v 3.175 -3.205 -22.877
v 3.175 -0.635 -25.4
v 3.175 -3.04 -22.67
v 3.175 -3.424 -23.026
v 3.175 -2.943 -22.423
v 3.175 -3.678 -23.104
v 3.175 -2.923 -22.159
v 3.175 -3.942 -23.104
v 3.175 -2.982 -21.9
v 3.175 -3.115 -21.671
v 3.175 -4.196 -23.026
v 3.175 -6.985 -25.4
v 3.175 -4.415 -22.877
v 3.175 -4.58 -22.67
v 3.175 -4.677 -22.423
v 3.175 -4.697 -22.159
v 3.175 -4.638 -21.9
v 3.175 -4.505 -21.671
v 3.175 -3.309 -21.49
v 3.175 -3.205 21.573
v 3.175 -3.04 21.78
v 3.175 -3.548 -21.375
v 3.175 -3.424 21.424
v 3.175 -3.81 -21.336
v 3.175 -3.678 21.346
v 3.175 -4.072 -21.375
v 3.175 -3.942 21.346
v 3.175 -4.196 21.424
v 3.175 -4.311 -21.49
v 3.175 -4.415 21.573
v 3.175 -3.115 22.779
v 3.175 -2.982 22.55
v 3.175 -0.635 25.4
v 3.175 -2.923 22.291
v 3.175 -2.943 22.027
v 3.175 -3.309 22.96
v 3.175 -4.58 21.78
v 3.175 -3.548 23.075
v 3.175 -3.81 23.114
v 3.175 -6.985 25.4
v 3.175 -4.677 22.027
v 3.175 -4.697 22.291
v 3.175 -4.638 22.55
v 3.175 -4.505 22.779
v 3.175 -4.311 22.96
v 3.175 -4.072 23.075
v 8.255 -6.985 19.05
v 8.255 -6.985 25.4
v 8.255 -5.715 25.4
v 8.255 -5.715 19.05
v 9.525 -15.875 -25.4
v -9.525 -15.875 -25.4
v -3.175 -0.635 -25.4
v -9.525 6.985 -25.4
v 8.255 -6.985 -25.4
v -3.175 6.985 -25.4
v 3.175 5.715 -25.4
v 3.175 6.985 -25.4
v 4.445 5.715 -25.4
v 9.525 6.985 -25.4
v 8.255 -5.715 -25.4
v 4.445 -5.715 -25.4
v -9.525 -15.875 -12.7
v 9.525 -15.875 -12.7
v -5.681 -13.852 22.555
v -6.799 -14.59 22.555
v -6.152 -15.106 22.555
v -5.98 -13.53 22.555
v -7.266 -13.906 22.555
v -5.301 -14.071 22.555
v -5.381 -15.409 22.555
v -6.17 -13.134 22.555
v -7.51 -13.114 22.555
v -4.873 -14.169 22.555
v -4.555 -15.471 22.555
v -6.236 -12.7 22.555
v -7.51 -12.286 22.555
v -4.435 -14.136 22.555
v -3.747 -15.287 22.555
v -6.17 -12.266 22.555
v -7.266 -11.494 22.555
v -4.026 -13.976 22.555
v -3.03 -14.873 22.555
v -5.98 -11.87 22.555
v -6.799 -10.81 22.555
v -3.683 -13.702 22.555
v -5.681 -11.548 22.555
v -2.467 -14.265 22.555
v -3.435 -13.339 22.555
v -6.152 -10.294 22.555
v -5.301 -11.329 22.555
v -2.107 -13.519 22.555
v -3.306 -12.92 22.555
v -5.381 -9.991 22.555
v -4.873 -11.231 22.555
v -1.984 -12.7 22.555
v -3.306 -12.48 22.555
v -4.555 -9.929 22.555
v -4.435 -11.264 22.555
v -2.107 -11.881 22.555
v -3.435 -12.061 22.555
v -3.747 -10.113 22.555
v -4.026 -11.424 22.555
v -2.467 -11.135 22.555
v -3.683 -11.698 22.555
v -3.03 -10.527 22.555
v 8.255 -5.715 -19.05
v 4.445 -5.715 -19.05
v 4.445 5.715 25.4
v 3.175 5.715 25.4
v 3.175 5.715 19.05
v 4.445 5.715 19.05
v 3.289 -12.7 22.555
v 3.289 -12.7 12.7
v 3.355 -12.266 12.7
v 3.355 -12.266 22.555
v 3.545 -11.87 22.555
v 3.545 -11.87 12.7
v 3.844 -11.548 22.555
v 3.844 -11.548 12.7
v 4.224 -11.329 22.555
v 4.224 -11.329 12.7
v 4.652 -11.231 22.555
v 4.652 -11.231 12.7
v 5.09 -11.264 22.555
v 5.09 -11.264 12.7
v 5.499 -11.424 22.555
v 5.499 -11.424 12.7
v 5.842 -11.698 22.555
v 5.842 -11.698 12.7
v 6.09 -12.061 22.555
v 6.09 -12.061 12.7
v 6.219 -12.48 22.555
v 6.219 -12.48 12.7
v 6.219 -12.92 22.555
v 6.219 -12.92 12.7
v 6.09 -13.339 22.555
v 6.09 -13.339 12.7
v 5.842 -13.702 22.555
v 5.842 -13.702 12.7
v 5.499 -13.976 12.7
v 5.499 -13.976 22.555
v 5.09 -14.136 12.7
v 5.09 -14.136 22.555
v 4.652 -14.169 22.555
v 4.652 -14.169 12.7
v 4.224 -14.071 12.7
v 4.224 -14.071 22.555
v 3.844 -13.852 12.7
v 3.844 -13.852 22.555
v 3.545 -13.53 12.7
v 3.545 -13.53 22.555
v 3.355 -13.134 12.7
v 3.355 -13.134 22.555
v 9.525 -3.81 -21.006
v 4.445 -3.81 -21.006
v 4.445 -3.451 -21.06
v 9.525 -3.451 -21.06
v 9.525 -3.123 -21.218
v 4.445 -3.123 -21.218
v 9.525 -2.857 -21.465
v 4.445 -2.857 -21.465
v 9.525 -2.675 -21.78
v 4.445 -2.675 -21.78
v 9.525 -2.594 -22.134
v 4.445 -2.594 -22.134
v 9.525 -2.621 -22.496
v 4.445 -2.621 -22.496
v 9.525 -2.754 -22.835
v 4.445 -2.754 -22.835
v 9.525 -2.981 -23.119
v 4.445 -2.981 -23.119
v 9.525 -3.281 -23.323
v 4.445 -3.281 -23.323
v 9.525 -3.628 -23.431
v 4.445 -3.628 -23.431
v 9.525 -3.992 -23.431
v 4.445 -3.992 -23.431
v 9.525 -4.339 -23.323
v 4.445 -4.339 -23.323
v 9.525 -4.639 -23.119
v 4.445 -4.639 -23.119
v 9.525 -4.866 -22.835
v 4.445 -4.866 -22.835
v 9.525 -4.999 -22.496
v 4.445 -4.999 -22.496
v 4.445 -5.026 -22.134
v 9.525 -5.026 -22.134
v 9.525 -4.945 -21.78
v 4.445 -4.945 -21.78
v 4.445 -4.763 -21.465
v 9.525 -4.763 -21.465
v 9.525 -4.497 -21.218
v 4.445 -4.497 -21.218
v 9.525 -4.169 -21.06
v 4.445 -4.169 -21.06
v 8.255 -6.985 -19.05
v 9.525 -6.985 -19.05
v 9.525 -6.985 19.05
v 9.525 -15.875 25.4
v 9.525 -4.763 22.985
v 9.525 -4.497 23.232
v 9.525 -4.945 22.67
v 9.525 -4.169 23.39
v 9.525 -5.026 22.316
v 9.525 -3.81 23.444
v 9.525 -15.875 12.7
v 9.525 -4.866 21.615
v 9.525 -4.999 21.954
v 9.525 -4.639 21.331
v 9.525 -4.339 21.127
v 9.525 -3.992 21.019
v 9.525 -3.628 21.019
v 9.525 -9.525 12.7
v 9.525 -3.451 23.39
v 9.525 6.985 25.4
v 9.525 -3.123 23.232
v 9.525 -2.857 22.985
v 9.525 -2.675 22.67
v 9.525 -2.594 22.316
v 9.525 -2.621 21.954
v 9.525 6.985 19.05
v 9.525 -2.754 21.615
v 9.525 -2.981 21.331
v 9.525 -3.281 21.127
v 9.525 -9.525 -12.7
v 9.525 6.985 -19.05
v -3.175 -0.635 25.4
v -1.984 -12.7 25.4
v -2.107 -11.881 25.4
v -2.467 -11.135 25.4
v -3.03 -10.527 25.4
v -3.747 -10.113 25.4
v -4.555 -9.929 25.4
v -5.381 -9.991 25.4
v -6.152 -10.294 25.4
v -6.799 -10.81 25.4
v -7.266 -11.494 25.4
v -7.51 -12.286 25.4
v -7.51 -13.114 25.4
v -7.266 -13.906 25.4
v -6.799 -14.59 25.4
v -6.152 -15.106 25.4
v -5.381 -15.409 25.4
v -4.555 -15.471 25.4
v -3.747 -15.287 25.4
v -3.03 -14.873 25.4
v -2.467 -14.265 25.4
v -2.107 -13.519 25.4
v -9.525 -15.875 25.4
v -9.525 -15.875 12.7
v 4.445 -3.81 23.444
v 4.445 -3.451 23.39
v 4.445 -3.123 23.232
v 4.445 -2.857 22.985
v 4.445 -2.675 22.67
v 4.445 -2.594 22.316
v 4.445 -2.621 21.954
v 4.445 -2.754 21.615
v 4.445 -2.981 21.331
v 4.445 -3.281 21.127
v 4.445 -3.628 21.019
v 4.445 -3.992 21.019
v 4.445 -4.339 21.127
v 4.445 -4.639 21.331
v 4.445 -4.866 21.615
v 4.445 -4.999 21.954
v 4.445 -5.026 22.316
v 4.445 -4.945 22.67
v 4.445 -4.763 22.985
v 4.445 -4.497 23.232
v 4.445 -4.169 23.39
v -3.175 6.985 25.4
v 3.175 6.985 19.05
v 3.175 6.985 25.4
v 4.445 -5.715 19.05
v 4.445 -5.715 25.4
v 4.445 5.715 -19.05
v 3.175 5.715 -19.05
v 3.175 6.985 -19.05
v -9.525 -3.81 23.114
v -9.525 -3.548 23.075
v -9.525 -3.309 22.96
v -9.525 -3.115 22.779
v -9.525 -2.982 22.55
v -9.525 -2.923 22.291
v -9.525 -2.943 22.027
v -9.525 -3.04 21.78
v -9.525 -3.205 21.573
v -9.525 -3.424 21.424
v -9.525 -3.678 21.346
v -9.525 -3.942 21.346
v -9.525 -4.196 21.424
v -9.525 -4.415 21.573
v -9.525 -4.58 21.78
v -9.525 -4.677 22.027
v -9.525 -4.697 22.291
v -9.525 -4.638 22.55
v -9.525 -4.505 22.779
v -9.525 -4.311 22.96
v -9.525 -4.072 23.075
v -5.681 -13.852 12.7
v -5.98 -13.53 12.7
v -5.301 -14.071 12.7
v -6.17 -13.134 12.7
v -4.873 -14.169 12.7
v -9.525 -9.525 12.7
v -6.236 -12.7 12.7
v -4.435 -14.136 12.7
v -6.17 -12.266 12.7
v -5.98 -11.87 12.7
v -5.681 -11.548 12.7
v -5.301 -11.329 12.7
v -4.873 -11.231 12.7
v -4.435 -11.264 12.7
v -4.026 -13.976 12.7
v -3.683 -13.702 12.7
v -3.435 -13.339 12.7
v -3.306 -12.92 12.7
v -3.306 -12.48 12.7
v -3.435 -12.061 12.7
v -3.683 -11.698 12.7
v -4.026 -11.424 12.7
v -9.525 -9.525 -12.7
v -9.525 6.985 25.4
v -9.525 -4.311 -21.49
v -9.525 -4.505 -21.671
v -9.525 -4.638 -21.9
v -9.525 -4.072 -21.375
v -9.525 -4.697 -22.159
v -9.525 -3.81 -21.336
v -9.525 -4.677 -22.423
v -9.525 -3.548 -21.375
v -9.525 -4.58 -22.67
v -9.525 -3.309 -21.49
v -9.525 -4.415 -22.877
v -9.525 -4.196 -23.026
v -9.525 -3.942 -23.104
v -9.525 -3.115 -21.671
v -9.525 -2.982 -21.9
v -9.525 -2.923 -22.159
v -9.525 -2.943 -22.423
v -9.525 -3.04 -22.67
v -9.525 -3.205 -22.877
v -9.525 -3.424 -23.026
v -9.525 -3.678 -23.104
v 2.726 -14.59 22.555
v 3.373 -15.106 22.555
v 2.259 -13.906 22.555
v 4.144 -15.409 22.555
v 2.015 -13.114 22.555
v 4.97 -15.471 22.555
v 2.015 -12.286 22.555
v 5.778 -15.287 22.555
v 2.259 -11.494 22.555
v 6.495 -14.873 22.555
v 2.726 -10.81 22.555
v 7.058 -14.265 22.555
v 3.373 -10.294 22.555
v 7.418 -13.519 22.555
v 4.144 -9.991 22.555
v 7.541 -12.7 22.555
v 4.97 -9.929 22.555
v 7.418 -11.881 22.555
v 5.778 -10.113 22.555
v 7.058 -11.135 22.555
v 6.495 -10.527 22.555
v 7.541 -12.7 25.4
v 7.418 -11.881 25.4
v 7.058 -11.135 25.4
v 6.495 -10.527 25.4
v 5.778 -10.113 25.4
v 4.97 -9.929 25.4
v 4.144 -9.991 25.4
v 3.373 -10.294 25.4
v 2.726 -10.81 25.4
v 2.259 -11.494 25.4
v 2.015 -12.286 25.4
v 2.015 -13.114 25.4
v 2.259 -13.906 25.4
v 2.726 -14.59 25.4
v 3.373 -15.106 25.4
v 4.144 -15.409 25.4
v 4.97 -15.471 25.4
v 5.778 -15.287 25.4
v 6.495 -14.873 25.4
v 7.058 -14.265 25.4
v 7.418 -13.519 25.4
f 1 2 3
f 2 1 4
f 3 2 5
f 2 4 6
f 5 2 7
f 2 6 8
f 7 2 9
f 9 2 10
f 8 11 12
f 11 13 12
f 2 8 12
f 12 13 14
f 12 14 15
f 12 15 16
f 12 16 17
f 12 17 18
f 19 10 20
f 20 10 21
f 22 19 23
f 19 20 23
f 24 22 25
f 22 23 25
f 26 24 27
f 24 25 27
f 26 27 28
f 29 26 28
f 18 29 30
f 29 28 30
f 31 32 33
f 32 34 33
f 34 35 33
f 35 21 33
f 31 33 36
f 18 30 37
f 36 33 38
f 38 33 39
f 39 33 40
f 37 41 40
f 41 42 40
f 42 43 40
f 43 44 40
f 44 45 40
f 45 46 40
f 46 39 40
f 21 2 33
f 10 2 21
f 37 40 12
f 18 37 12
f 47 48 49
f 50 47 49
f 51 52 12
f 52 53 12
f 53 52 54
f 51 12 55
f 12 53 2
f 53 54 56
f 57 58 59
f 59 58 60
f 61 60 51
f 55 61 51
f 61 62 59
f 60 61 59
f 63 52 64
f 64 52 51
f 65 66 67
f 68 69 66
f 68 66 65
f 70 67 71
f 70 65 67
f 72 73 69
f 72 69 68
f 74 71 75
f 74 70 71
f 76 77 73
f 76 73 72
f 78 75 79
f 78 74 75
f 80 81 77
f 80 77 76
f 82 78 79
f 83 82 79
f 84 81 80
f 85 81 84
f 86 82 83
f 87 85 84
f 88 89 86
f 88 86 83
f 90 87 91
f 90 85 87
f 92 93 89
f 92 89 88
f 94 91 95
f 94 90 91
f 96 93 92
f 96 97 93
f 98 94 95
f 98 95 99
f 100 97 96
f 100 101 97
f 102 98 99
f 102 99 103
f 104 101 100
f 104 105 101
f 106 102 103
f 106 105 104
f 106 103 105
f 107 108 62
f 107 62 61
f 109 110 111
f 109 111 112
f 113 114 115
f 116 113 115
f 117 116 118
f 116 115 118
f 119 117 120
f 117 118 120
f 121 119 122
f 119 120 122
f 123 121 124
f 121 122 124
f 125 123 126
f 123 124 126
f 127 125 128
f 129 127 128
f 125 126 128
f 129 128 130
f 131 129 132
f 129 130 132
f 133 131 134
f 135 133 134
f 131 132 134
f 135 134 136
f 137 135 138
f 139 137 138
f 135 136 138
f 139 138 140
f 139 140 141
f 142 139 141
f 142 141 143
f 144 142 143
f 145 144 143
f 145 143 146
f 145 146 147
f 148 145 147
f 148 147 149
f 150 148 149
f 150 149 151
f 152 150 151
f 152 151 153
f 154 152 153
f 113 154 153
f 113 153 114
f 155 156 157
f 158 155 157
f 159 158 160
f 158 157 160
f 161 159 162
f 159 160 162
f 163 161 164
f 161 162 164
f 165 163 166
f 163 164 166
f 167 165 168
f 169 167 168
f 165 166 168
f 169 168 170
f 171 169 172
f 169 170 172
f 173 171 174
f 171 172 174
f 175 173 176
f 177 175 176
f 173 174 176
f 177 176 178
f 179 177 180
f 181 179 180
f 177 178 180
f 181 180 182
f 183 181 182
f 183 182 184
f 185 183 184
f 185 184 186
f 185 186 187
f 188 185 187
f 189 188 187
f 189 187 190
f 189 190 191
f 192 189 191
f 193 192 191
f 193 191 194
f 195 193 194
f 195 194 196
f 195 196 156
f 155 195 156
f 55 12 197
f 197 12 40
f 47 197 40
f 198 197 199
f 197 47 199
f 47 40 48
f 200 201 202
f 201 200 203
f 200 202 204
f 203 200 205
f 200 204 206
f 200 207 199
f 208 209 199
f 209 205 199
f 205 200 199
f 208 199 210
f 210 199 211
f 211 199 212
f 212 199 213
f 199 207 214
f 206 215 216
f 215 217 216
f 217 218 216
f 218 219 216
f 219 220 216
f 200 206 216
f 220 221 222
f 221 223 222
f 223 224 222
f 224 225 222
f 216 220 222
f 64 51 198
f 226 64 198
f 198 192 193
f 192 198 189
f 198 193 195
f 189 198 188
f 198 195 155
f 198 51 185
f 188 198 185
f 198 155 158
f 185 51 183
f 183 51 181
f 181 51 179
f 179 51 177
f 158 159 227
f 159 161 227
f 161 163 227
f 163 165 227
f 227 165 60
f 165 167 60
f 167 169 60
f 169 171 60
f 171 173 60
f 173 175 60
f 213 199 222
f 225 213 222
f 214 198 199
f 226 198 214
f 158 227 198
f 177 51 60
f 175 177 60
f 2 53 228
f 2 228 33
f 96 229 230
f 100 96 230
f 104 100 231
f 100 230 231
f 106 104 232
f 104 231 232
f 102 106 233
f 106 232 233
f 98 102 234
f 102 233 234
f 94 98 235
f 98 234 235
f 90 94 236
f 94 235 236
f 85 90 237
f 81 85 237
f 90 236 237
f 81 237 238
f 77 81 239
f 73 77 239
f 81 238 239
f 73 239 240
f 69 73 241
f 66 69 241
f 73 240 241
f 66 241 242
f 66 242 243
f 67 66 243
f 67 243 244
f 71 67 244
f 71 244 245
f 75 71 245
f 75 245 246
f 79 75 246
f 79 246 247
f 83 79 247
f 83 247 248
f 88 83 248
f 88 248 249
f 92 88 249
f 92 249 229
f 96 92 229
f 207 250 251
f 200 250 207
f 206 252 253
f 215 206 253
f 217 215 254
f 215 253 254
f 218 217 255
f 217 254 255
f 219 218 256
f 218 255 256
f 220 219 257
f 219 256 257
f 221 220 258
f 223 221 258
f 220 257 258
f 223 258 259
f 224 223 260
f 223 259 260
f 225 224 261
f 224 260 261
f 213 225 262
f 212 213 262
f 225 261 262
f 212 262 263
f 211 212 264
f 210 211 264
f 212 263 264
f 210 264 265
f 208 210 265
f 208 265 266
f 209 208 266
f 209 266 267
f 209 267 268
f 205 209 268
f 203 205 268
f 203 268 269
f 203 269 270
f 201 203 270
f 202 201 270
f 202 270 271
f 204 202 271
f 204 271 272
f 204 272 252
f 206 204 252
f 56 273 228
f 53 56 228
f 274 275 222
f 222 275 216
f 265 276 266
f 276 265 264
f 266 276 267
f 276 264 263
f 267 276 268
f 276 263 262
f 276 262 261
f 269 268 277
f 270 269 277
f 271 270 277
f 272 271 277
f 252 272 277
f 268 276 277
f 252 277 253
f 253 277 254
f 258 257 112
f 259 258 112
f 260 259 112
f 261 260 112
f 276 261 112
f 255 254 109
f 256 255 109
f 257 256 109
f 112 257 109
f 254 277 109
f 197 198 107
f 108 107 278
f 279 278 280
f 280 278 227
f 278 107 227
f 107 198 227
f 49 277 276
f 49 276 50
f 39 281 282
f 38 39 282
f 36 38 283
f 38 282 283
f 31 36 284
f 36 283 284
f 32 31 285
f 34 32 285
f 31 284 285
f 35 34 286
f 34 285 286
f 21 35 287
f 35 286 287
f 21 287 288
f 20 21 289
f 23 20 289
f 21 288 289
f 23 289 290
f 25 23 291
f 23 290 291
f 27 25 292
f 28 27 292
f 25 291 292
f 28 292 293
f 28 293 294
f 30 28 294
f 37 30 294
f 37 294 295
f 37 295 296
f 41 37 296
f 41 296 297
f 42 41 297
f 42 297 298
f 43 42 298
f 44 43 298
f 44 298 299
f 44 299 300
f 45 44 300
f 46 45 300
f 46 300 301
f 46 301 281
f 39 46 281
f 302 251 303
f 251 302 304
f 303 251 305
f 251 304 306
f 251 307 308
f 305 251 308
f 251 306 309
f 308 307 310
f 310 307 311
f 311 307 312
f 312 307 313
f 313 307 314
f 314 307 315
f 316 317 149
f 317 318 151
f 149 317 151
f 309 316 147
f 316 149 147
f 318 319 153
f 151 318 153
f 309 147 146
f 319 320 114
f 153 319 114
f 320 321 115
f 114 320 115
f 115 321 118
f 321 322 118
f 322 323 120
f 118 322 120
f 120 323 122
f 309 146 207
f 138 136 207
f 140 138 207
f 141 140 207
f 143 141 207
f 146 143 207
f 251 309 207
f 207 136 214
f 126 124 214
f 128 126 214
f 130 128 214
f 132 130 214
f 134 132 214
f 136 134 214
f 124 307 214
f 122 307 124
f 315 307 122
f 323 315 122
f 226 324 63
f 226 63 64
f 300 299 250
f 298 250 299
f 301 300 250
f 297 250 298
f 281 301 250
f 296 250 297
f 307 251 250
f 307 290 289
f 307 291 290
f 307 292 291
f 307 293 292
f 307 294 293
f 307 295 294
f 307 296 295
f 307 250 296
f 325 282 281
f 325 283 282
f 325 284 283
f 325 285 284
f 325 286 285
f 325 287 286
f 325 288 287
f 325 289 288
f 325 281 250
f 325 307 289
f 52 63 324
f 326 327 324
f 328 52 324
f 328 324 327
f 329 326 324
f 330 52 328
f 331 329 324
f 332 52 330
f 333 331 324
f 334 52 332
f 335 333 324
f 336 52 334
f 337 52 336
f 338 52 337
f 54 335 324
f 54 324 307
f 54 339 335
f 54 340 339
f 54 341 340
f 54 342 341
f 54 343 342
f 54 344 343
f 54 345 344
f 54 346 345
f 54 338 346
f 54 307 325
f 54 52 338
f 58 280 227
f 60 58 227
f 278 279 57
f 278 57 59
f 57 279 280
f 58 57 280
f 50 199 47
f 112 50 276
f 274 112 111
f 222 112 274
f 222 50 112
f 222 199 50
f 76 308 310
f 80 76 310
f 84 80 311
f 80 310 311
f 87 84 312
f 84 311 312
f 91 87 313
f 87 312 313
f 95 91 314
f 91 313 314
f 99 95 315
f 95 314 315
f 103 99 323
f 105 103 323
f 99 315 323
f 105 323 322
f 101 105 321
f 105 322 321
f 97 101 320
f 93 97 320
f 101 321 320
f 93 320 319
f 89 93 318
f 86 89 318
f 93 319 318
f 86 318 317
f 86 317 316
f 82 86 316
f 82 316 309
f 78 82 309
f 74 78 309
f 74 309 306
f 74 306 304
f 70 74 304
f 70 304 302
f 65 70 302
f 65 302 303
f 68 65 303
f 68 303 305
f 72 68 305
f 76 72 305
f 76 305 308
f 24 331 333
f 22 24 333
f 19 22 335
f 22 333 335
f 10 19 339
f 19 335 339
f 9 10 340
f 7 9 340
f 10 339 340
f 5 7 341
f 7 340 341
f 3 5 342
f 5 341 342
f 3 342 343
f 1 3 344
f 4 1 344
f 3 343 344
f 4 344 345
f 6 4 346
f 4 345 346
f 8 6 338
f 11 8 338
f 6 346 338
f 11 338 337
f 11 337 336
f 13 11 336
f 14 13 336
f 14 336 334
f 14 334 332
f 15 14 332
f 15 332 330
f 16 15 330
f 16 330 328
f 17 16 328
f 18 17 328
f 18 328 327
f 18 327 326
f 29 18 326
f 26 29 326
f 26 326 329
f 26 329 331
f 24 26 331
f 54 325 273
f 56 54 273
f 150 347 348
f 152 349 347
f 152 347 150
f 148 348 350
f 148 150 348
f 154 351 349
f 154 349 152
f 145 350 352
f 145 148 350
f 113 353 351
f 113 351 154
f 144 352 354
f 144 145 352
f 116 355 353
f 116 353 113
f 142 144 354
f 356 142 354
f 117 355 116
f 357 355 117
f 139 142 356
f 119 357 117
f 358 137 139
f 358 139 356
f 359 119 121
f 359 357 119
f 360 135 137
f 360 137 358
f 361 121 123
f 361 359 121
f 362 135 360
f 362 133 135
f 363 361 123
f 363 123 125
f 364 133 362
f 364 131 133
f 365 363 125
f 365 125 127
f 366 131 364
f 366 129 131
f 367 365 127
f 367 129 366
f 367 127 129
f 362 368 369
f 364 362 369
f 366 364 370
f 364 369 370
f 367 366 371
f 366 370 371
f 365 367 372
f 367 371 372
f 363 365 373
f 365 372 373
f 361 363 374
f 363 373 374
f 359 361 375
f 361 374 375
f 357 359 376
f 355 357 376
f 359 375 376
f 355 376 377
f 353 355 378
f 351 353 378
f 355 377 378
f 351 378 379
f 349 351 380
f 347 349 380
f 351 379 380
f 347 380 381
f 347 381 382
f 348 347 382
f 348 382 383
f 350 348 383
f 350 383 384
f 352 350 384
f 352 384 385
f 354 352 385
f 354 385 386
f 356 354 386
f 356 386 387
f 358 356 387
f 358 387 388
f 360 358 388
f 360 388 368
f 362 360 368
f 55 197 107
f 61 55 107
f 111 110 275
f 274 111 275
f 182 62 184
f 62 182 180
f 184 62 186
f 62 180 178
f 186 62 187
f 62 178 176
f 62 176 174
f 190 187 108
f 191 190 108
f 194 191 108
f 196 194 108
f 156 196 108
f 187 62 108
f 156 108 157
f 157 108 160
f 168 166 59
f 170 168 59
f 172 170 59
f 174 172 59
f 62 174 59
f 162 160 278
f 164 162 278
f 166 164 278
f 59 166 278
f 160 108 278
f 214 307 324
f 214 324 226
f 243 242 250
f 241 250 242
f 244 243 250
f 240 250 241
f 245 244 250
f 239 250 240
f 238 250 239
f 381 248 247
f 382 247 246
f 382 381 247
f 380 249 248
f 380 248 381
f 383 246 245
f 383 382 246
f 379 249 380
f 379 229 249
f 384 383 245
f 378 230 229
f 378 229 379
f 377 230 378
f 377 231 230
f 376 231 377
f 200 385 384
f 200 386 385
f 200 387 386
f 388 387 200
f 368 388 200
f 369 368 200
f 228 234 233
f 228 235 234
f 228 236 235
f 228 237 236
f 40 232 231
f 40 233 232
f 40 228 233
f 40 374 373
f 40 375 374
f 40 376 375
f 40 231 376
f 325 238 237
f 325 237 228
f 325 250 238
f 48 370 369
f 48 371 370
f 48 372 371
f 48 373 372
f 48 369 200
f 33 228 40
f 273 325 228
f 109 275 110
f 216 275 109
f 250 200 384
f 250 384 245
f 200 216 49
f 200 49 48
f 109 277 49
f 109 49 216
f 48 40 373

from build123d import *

# Parameters (mm, degrees)
SKETCH2_W                                      = 19.05
SKETCH2_H                                      = 19.05
BOSS_EXTRUDE1_DEPTH                            = 25.4
CUT_EXTRUDE1_DEPTH                             = 54.497649479
SKETCH6_W                                      = 1.27
SKETCH6_H                                      = 11.43
SKETCH6_H_2                                    = 1.27
SKETCH6_W_2                                    = 3.81
CUT_EXTRUDE2_DEPTH                             = 54.497649479
CUT_EXTRUDE3_REACH                             = 35.148
SKETCH7_W                                      = 38.1
SKETCH7_H                                      = 13.97
SKETCH8_W                                      = 19.05
SKETCH8_H                                      = 6.35
BOSS_EXTRUDE2_DEPTH                            = 12.7
CBORE_FOR_4_SOCKET_HEAD_CAP_SCREW1_D           = 2.9464
CBORE_FOR_4_SOCKET_HEAD_CAP_SCREW1_DEPTH       = 12.7
CBORE_FOR_4_SOCKET_HEAD_CAP_SCREW1_CBORE_D     = 5.55752
CBORE_FOR_4_SOCKET_HEAD_CAP_SCREW1_CBORE_DEPTH = 2.8448
F_2_CLEARANCE_HOLE1_D                          = 2.4384
F_2_CLEARANCE_HOLE1_DEPTH                      = 5.08
F_2_56_TAPPED_HOLE1_D                          = 1.778


with BuildPart() as part:
    # Sketch2 → Boss-Extrude1 (new, symmetric)
    with BuildSketch(Plane.XY):
        Rectangle(SKETCH2_W, SKETCH2_H)
    extrude(amount=BOSS_EXTRUDE1_DEPTH, both=True)

    # Sketch4 → Cut-Extrude1 (cut, through all)
    with BuildSketch(Plane(origin=(-1.506852909, 3.110534069, 25.4), x_dir=(1, 0, 0), z_dir=(0, 0, 1))):
        Polygon((-8.018147091, 6.414465931), (-8.018147091, 3.874465931), (-1.668147091, 3.874465931), (-1.668147091, -3.745534069), (4.681852909, -3.745534069), (4.681852909, 3.874465931), (11.031852909, 3.874465931), (11.031852909, 6.414465931), align=None)
    extrude(amount=-CUT_EXTRUDE1_DEPTH, mode=Mode.SUBTRACT)

    # Sketch6 → Cut-Extrude2 (cut, through all)
    with BuildSketch(Plane(origin=(-1.506852909, 3.110534069, 25.4), x_dir=(1, 0, 0), z_dir=(0, 0, 1))):
        with Locations((5.316852909, -3.110534069)):
            Rectangle(SKETCH6_W, SKETCH6_H)
        with Locations((5.316852909, -9.460534069)):
            Rectangle(SKETCH6_W, SKETCH6_H_2)
        with Locations((7.856852909, -9.460534069)):
            Rectangle(SKETCH6_W_2, SKETCH6_H_2)
    extrude(amount=-CUT_EXTRUDE2_DEPTH, mode=Mode.SUBTRACT)

    # Cut-Extrude3: up to this face of the body (flat: up to its plane)
    cut_extrude3_end = Plane(part.part.faces().sort_by_distance((3.175, 6.35, 0))[0])
    # Sketch7 → Cut-Extrude3 (cut, up to the picked face)
    with BuildSketch(Plane(origin=(9.525, 0, 0), x_dir=(0, 0, -1), z_dir=(1, 0, 0)), mode=Mode.PRIVATE) as cut_extrude3_sk1:
        Rectangle(SKETCH7_W, SKETCH7_H)
    cut_extrude3_tool1 = split(extrude(cut_extrude3_sk1.sketch, amount=-CUT_EXTRUDE3_REACH, mode=Mode.PRIVATE), bisect_by=cut_extrude3_end, keep=Keep.BOTH, mode=Mode.PRIVATE)
    add(cut_extrude3_tool1.solids().sort_by(Axis((9.525, 0, 0), (-1, 0, 0)))[0], mode=Mode.SUBTRACT)

    # Sketch8 → Boss-Extrude2 (add)
    with BuildSketch(Plane.XY.offset(25.4)):
        with Locations((0, -12.7)):
            Rectangle(SKETCH8_W, SKETCH8_H)
    boss_extrude2 = extrude(amount=-BOSS_EXTRUDE2_DEPTH)

    # Mirror1: Boss-Extrude2 across plane
    add(boss_extrude2.mirror(Plane.XY))

    # CBORE for #4 Socket Head Cap Screw1
    with Locations(Plane.XY.offset(25.4)):
        with Locations((-4.7625, -12.7), (4.7625, -12.7)):
            CounterBoreHole(CBORE_FOR_4_SOCKET_HEAD_CAP_SCREW1_D / 2, CBORE_FOR_4_SOCKET_HEAD_CAP_SCREW1_CBORE_D / 2, CBORE_FOR_4_SOCKET_HEAD_CAP_SCREW1_CBORE_DEPTH, depth=CBORE_FOR_4_SOCKET_HEAD_CAP_SCREW1_DEPTH)

    # #2 Clearance Hole1
    with Locations(Plane(origin=(9.525, 0, 0), x_dir=(0, 0, -1), z_dir=(1, 0, 0))):
        with Locations((-22.225, -3.81), (22.225, -3.81)):
            Hole(F_2_CLEARANCE_HOLE1_D / 2, depth=F_2_CLEARANCE_HOLE1_DEPTH)

    # #2-56 Tapped Hole1 (through all)
    with Locations(Plane(origin=(3.175, 0, 0), x_dir=(0, 0, -1), z_dir=(1, 0, 0))):
        with Locations((-22.225, -3.81), (22.225, -3.81)):
            Hole(F_2_56_TAPPED_HOLE1_D / 2)


solid = part.part
